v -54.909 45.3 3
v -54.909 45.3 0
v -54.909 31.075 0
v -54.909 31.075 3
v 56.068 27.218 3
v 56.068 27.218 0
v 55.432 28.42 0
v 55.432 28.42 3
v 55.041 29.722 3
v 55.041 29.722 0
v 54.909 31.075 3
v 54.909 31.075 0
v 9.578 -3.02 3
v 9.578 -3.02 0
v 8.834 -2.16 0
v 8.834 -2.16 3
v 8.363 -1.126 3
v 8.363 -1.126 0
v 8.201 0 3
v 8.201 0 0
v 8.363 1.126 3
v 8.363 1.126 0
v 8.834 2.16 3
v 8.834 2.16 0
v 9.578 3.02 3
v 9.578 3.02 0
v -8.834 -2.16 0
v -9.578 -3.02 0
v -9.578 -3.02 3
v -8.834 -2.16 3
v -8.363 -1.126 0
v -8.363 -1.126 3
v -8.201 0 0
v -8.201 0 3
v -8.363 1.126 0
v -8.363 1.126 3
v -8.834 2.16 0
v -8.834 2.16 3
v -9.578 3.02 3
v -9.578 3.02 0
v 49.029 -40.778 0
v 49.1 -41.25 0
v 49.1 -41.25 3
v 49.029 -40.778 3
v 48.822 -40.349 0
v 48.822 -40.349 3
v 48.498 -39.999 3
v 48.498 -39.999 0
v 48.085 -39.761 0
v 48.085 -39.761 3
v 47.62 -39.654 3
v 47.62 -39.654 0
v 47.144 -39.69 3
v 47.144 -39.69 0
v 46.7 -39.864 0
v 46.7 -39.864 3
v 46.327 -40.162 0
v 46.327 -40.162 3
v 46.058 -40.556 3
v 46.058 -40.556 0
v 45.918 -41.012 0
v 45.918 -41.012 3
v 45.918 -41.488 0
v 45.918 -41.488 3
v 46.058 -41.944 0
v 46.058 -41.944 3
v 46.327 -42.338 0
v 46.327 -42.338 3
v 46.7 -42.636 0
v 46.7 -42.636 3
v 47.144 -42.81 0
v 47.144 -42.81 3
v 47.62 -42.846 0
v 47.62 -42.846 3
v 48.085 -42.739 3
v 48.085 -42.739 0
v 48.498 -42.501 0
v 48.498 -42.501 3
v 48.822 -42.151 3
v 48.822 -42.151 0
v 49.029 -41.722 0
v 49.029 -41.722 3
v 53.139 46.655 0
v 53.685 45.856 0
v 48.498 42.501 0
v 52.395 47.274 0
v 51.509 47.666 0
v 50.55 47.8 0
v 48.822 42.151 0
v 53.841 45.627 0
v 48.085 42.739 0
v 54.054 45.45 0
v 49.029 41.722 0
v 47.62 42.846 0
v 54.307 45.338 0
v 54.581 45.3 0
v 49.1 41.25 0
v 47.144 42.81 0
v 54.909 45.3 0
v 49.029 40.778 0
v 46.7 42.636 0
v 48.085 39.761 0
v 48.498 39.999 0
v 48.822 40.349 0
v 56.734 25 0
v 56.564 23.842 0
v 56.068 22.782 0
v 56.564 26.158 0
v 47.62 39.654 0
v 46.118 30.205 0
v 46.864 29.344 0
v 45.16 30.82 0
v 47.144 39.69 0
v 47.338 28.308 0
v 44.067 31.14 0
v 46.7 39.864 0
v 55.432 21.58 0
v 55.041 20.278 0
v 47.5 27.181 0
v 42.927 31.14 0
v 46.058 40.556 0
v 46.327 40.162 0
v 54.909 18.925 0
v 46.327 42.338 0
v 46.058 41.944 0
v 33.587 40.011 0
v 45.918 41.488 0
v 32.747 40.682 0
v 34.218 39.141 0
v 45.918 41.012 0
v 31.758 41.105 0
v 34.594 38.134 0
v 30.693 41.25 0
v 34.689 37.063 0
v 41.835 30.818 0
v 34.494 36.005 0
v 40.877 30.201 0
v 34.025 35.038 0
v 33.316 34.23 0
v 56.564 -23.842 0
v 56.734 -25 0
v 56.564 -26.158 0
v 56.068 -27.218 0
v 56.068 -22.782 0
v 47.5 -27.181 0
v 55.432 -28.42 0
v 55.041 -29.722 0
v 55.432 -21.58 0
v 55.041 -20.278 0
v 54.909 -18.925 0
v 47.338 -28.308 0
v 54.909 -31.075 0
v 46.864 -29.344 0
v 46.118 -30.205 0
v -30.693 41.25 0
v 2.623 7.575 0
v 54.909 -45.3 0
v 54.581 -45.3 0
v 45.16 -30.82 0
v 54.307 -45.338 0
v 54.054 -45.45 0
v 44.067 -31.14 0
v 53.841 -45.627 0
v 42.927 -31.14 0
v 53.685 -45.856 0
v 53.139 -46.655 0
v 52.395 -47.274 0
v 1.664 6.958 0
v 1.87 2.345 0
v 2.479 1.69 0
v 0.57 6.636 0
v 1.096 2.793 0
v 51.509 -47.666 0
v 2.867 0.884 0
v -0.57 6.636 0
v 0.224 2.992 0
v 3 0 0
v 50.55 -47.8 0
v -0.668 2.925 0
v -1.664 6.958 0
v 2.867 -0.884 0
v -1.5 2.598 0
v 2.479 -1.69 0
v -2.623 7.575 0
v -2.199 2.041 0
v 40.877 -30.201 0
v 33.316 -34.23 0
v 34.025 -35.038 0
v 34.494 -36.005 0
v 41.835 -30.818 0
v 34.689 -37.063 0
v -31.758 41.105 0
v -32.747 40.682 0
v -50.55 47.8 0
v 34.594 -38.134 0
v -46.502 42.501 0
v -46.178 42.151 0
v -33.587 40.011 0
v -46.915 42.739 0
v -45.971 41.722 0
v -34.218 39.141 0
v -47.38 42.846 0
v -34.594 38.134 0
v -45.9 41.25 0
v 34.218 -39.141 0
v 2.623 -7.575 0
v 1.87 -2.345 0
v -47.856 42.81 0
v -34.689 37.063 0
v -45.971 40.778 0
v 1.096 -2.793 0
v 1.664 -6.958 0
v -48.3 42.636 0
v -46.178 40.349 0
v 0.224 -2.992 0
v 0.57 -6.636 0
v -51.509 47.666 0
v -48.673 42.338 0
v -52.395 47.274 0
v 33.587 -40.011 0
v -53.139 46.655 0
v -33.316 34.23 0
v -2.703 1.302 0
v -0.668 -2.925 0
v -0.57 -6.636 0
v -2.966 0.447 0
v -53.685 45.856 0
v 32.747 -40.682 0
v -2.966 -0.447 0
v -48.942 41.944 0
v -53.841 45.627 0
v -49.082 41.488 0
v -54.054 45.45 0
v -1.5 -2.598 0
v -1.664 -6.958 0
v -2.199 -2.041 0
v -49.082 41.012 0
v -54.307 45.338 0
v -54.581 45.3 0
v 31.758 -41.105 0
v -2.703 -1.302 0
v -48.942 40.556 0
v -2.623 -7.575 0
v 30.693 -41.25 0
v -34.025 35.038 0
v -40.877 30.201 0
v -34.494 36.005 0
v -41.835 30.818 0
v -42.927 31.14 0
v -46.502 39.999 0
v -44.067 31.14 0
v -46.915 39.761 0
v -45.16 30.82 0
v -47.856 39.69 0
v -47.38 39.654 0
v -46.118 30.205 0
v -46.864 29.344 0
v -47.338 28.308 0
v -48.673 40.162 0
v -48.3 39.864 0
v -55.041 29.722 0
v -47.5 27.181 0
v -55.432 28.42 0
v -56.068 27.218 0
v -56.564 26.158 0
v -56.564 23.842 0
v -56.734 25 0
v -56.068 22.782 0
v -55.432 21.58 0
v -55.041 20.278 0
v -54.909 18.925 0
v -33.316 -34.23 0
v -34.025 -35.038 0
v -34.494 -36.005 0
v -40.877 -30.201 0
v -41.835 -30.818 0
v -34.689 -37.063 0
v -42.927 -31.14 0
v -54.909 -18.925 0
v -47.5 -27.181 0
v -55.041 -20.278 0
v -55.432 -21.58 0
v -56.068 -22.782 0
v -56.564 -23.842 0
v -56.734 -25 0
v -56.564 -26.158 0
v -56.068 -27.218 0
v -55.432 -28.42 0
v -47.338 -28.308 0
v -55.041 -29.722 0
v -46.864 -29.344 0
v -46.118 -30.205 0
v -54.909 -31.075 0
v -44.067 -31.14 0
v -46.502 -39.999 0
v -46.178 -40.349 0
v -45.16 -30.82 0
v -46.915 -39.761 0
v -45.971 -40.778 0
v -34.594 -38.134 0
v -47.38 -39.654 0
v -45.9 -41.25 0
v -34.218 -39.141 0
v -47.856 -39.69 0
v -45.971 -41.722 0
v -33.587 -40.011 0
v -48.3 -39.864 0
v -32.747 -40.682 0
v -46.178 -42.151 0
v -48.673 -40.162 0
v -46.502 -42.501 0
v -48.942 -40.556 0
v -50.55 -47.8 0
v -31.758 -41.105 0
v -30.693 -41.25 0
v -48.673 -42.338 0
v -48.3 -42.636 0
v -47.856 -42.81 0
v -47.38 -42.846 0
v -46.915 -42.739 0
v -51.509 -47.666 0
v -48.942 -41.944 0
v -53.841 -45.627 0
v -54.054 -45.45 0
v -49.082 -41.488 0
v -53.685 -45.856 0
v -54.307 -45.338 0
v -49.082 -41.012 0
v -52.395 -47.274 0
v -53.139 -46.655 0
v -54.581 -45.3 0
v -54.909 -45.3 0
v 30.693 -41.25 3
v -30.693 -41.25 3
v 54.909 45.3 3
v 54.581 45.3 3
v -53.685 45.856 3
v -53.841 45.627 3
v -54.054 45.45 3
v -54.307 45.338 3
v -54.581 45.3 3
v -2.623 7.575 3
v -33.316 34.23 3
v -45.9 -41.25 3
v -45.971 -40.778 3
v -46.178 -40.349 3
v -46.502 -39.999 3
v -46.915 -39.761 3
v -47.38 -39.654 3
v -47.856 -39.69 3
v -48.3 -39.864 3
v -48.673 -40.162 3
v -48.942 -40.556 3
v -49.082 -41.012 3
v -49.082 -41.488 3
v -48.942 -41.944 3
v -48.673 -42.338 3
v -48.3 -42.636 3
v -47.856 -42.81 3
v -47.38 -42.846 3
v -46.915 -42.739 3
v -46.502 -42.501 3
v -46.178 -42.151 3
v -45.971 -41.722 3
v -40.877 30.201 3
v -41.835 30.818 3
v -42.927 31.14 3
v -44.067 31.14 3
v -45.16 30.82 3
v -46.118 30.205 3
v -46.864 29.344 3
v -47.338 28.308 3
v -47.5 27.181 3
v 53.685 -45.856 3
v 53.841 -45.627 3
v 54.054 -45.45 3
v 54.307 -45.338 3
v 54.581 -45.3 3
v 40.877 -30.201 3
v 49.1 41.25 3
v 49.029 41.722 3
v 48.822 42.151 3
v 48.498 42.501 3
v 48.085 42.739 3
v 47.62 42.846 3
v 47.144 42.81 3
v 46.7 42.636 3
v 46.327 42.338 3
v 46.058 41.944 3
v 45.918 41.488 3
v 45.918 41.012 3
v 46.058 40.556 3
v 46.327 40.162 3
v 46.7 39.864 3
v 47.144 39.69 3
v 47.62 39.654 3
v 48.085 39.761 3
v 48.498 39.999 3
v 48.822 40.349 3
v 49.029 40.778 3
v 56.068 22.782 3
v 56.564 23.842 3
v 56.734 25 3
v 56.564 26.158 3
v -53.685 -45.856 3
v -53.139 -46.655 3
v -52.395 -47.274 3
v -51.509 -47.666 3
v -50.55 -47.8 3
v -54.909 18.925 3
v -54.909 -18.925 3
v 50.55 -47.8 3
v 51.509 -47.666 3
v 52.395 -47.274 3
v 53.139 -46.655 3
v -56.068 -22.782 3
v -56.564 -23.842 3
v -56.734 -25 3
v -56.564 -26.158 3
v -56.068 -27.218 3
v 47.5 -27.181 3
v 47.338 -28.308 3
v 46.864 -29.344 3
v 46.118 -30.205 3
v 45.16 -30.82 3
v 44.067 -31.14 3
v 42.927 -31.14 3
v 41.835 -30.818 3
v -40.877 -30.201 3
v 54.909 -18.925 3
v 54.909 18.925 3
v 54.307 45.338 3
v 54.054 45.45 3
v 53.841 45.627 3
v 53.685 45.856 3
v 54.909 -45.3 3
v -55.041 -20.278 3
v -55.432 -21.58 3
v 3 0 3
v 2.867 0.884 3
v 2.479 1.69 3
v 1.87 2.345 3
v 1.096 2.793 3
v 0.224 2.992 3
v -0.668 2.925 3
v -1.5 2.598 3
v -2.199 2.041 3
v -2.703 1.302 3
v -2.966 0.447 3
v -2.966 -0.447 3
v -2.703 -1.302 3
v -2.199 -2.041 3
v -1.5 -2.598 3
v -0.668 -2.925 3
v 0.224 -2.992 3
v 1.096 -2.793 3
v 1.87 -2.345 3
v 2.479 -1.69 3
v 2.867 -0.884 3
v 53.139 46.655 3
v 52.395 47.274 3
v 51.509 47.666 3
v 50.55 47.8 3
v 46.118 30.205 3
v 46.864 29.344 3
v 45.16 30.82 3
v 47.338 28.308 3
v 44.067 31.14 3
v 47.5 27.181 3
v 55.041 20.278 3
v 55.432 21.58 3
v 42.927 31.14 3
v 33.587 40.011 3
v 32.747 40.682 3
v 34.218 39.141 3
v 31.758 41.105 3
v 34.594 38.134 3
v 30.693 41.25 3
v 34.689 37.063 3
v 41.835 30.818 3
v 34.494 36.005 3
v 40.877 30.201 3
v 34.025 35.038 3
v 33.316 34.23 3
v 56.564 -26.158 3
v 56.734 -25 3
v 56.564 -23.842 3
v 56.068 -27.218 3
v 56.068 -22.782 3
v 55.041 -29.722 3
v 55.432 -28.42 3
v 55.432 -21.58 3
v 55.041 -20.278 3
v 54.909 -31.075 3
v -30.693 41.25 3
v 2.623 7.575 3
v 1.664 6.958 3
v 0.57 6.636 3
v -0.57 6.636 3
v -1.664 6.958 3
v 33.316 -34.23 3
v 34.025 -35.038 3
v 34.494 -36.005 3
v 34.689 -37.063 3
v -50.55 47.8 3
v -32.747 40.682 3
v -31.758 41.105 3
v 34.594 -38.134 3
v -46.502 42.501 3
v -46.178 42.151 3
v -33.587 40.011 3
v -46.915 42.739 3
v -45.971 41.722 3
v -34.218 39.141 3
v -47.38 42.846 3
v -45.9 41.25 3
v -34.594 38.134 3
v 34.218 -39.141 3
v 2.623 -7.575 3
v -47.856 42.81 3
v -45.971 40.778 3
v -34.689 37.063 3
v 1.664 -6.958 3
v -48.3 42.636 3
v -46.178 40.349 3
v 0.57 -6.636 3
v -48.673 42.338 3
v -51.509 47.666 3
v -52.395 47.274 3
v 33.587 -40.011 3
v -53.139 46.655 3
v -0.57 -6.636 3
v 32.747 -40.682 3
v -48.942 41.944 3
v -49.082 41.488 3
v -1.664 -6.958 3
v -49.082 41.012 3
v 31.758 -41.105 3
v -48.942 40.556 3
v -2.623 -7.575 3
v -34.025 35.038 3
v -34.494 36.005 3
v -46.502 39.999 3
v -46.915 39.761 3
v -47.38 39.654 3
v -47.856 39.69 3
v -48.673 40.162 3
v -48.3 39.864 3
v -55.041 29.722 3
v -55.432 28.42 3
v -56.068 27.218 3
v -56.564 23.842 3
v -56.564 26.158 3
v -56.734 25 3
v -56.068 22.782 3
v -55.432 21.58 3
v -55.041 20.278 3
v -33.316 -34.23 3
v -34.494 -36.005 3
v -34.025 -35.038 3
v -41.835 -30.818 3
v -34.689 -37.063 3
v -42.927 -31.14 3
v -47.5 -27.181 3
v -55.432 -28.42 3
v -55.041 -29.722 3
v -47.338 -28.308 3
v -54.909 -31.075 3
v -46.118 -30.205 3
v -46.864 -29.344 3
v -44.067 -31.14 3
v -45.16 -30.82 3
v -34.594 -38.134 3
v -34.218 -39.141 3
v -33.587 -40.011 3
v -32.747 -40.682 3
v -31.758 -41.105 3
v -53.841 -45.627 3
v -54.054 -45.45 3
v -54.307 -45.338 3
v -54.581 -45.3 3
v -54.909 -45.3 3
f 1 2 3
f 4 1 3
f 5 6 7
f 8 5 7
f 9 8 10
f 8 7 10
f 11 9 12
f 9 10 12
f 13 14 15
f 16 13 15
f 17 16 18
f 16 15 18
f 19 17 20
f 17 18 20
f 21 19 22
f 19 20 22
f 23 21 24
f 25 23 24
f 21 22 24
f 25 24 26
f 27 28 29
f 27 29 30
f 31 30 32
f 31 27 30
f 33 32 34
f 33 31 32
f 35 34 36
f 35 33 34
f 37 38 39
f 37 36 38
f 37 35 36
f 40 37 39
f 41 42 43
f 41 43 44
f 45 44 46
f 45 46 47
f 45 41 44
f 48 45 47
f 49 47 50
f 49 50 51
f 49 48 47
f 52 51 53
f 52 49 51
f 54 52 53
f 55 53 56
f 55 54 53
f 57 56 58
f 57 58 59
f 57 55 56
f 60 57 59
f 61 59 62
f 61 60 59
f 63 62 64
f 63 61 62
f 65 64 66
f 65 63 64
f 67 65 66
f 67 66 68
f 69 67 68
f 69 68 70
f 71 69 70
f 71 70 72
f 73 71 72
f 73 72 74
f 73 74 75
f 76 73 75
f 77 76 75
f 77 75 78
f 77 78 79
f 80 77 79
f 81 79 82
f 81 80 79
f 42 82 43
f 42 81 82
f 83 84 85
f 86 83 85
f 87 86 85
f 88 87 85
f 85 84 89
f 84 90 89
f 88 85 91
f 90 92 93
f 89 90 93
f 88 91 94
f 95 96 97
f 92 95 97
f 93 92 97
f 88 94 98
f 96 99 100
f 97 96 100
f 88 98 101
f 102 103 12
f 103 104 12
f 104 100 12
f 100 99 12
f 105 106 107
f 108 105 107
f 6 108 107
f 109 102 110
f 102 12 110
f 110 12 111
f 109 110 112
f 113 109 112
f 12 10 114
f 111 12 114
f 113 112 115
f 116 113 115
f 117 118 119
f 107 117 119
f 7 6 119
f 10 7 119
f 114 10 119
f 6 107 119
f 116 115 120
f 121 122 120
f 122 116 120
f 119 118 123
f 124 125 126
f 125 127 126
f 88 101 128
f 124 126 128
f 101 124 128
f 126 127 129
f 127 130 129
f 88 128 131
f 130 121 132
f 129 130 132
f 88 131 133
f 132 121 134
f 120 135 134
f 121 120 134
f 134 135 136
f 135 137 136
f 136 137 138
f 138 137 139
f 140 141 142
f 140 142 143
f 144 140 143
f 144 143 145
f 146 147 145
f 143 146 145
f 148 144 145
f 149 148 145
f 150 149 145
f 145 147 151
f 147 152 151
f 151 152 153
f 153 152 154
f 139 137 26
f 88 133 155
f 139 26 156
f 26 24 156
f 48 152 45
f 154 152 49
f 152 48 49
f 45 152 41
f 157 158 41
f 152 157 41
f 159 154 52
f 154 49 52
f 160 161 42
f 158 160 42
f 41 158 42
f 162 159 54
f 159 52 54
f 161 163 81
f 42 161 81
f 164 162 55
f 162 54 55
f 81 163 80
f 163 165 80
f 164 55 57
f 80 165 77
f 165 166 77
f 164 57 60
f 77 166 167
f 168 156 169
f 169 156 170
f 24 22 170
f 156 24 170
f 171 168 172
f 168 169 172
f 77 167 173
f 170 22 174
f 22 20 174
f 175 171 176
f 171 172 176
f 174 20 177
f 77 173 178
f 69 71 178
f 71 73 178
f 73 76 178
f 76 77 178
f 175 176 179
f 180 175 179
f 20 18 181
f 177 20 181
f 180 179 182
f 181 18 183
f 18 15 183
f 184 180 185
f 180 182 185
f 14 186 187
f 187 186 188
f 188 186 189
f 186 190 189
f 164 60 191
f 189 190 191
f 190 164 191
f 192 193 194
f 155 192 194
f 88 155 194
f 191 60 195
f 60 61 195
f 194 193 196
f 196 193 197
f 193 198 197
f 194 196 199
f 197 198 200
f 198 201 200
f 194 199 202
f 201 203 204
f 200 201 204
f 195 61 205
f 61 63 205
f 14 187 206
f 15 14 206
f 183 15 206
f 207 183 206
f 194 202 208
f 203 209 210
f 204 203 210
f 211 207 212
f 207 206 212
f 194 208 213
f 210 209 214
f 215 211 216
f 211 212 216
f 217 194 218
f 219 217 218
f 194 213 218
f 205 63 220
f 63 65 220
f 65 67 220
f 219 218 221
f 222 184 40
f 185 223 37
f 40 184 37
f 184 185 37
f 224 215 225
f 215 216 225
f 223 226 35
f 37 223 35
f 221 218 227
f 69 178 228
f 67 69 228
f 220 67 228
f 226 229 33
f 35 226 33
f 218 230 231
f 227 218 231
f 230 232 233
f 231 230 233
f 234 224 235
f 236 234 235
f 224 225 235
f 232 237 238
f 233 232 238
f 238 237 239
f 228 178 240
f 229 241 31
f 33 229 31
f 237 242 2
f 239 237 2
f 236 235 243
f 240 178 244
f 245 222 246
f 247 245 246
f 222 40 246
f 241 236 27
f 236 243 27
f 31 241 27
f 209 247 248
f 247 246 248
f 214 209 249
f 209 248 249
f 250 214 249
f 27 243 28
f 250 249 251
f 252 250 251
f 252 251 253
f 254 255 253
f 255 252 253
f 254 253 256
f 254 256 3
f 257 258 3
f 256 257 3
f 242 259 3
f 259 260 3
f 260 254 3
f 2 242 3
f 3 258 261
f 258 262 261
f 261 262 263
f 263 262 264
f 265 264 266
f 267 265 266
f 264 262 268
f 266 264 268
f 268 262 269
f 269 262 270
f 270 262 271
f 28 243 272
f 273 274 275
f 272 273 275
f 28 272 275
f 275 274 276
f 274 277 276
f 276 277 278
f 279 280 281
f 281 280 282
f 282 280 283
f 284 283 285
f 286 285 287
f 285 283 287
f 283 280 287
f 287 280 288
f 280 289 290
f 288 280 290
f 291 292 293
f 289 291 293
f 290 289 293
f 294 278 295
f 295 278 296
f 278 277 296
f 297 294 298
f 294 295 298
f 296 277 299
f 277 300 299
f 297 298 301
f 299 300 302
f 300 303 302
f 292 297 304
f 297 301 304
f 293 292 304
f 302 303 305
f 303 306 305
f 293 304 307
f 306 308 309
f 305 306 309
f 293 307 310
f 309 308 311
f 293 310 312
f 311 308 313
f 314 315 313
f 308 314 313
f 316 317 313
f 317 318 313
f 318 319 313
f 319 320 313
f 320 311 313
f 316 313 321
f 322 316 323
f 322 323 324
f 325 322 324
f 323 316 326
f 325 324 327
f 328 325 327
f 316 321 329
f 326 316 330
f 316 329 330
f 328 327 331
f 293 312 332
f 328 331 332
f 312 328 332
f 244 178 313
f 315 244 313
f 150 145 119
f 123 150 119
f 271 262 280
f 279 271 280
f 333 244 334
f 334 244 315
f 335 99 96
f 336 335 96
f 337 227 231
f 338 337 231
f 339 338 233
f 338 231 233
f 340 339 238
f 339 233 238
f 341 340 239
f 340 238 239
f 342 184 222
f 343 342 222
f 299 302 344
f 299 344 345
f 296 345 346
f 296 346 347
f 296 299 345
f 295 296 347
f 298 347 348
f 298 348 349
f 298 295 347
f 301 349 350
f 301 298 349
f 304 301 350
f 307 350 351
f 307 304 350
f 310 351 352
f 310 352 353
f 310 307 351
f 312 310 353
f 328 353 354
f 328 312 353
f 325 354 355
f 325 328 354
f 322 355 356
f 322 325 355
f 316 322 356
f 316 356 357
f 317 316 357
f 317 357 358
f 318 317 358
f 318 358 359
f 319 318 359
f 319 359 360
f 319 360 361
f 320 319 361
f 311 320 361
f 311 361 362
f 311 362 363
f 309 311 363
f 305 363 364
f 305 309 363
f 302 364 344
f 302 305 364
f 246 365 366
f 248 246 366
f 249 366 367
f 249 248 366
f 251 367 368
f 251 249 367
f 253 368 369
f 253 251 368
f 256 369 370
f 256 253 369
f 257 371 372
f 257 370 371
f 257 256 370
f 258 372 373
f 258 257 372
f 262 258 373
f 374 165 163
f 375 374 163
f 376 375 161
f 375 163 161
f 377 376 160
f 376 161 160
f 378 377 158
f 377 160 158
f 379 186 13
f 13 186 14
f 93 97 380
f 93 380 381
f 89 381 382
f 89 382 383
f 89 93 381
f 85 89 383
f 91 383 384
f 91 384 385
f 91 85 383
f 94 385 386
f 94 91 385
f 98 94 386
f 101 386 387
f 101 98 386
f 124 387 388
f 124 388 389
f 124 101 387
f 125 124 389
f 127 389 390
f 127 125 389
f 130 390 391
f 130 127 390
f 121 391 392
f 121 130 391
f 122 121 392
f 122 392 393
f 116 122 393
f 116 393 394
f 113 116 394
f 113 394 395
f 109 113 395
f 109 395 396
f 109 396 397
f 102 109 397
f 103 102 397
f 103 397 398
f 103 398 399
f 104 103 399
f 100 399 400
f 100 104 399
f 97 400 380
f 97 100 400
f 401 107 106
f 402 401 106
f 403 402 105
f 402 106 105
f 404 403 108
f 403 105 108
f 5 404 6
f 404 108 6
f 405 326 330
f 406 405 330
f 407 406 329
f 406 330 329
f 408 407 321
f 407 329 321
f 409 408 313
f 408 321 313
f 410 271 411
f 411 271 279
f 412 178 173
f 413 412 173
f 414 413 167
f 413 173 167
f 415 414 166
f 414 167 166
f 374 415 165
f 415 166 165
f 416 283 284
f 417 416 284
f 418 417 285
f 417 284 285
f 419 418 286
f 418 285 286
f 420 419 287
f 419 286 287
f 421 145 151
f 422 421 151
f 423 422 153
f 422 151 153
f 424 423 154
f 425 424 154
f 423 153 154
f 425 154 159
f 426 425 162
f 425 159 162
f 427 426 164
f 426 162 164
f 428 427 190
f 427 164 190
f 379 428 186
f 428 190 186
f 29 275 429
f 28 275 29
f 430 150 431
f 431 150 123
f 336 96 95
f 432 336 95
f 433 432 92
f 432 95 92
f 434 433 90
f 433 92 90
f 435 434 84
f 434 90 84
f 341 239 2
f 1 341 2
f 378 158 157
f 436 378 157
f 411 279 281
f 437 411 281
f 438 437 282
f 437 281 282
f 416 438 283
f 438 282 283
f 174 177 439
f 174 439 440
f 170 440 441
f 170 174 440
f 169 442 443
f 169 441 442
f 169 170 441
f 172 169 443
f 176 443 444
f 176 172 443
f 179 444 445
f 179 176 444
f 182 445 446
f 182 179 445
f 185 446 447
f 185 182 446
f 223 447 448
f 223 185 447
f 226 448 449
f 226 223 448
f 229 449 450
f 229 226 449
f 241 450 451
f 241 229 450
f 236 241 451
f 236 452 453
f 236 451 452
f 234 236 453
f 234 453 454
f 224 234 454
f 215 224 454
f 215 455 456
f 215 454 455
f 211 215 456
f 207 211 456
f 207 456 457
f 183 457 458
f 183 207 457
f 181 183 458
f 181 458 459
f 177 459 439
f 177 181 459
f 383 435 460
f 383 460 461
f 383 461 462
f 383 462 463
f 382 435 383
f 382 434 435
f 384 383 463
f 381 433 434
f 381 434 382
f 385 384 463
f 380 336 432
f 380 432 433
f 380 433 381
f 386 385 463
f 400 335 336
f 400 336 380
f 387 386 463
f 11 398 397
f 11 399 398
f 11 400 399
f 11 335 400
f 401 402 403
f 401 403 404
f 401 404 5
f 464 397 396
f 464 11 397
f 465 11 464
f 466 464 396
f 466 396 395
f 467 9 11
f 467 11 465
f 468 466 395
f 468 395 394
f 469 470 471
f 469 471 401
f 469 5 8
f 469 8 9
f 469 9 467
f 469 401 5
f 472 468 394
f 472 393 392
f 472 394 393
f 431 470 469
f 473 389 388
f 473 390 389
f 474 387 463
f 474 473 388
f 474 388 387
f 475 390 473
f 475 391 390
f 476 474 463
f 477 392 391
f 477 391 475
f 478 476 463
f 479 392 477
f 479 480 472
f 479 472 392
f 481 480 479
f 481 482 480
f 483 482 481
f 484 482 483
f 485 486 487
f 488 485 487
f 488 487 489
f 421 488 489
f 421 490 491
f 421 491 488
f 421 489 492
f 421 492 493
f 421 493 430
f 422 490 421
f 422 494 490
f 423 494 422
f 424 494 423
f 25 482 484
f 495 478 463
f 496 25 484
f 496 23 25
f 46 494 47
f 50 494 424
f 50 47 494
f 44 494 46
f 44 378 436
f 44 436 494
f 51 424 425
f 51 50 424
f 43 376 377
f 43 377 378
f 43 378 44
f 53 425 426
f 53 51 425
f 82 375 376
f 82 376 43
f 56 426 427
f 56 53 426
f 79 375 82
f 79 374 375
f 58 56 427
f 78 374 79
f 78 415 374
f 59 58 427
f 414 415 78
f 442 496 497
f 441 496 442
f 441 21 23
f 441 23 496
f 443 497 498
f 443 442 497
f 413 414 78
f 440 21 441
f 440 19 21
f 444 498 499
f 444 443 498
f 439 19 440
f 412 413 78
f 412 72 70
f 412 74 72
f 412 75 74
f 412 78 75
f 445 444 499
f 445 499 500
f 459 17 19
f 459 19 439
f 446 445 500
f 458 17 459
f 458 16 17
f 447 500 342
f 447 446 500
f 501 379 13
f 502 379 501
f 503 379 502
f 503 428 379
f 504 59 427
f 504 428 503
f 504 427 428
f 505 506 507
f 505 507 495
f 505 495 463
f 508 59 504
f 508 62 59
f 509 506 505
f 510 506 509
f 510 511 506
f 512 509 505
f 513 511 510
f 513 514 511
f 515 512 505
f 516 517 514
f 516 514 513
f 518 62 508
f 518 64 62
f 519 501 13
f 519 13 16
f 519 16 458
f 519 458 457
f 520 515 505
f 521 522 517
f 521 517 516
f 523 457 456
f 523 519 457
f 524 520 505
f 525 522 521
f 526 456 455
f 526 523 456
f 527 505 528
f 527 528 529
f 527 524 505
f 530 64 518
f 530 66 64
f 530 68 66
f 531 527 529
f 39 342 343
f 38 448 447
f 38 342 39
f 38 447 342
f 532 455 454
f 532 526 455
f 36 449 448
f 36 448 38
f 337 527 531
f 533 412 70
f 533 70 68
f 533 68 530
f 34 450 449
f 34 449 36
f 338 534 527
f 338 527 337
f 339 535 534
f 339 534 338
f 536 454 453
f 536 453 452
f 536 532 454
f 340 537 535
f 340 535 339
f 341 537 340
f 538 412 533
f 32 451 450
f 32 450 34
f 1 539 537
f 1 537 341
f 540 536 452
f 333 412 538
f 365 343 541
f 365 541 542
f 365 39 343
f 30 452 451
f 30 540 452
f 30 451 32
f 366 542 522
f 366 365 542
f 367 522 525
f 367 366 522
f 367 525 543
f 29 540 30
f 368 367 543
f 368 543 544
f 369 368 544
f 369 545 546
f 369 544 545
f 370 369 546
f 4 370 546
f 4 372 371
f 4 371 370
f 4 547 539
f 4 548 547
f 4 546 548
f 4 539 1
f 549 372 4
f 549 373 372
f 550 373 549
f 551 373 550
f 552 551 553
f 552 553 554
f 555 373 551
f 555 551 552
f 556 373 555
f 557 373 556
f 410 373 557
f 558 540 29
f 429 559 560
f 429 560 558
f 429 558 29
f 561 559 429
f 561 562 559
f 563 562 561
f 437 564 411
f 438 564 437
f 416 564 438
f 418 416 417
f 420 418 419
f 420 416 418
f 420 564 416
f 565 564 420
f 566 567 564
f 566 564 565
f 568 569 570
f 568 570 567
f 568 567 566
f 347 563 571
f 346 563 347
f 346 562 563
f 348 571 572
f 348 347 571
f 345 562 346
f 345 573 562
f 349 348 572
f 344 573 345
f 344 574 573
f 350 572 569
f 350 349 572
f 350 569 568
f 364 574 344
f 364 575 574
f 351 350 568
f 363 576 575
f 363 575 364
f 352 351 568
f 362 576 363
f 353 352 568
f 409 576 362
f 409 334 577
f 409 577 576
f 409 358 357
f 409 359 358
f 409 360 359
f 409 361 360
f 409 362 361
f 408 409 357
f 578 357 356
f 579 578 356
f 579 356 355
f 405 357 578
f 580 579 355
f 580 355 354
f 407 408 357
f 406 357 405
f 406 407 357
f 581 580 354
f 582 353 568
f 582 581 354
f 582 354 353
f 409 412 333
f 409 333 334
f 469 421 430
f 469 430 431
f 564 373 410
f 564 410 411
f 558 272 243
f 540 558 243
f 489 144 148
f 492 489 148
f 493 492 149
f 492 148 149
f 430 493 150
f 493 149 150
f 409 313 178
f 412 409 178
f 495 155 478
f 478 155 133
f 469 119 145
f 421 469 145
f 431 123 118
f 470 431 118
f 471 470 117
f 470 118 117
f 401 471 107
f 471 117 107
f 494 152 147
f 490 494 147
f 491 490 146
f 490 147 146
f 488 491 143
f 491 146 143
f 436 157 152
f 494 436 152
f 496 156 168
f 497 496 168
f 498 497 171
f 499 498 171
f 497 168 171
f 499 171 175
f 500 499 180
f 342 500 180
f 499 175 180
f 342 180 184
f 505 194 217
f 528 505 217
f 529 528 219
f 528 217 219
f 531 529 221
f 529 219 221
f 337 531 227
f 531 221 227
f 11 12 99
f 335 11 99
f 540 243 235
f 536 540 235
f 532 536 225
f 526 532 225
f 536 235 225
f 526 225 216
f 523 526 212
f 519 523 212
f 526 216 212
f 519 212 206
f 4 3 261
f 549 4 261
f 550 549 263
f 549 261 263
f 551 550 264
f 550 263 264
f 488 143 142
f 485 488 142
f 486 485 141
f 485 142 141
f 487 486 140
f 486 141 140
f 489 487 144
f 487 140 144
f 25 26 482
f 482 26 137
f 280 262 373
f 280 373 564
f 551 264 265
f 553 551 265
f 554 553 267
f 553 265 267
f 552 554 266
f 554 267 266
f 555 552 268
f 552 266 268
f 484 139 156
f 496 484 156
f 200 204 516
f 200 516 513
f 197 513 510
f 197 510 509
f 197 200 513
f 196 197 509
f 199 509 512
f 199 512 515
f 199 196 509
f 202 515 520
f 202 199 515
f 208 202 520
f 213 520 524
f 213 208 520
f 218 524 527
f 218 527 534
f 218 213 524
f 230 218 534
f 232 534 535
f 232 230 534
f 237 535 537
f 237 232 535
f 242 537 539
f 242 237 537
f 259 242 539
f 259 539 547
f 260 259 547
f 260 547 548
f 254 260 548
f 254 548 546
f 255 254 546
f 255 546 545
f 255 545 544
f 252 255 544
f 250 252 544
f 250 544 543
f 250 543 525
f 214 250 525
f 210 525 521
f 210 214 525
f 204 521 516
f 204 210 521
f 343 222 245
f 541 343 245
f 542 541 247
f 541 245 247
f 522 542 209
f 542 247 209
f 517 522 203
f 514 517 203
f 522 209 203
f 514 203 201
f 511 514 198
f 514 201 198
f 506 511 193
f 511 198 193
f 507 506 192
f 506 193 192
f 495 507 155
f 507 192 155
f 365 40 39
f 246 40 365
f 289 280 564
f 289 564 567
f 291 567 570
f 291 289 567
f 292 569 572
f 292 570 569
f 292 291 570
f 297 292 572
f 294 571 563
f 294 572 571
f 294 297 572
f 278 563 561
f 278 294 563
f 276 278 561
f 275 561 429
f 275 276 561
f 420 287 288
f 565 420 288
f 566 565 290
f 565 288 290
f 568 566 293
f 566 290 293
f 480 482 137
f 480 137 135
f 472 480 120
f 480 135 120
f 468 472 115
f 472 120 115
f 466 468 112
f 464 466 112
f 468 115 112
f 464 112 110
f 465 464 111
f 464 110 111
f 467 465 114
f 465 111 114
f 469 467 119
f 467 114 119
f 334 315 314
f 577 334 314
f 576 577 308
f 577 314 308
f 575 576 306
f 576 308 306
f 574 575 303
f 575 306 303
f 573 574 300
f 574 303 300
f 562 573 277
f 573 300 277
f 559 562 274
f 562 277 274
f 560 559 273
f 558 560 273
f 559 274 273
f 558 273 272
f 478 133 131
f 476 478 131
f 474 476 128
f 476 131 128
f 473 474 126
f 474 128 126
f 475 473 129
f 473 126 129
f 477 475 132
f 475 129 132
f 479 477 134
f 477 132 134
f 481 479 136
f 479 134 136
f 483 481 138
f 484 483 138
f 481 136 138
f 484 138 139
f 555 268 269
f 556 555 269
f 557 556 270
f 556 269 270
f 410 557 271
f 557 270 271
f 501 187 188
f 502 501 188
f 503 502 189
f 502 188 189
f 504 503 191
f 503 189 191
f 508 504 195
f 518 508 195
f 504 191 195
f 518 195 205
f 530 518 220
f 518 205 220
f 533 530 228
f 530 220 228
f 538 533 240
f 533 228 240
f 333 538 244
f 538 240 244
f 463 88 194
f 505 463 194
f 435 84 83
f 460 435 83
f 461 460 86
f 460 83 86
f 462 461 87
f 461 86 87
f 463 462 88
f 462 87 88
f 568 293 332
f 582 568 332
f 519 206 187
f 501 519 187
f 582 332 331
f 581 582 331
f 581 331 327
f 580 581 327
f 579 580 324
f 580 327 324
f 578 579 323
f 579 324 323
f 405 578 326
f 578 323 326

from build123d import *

# Parameters (mm, degrees)
SKETCH1_R               = 1.6
BOSS_EXTRUDE1_DEPTH     = 3
CUT_EXTRUDE1_DEPTH      = 75.246874183
CUT_EXTRUDE1_DEPTH_BACK = 75.246874183
CUT_EXTRUDE2_DEPTH      = 75.246874183
CUT_EXTRUDE2_DEPTH_BACK = 75.246874183
SKETCH4_R               = 3


with BuildPart() as part:
    # Sketch1 → Boss-Extrude1 (new body)
    with BuildSketch(Plane(origin=(0, 0, 0), x_dir=(-1, 0, 0), z_dir=(0, 0, 1))):
        with BuildLine():
            Line((-54.909101966, 18.924588491), (-54.909101966, -18.924588491))
            ThreePointArc((-54.909101966, -18.924588491), (-55.205040179, -20.938429487), (-56.067832125, -22.781992624))
            ThreePointArc((-56.067832125, -22.781992624), (-56.734101966, -25), (-56.067832125, -27.218007376))
            ThreePointArc((-56.067832125, -27.218007376), (-55.205040179, -29.061570513), (-54.909101966, -31.075411509))
            Line((-54.909101966, -31.075411509), (-54.909101966, -45.3))
            Line((-54.909101966, -45.3), (-54.581128874, -45.3))
            ThreePointArc((-54.581128874, -45.3), (-54.054082597, -45.450163414), (-53.685322458, -45.855555556))
            ThreePointArc((-53.685322458, -45.855555556), (-52.394661968, -47.27442805), (-50.55, -47.8))
            Line((-50.55, -47.8), (50.55, -47.8))
            ThreePointArc((50.55, -47.8), (52.394661968, -47.27442805), (53.685322458, -45.855555556))
            ThreePointArc((53.685322458, -45.855555556), (54.054082597, -45.450163414), (54.581128874, -45.3))
            Line((54.581128874, -45.3), (54.909101966, -45.3))
            Line((54.909101966, -45.3), (54.909101966, -31.075411509))
            ThreePointArc((54.909101966, -31.075411509), (55.205040179, -29.061570513), (56.067832125, -27.218007376))
            ThreePointArc((56.067832125, -27.218007376), (56.734101966, -25), (56.067832125, -22.781992624))
            ThreePointArc((56.067832125, -22.781992624), (55.205040179, -20.938429487), (54.909101966, -18.924588491))
            Line((54.909101966, -18.924588491), (54.909101966, 18.924588491))
            ThreePointArc((54.909101966, 18.924588491), (55.205040179, 20.938429487), (56.067832125, 22.781992624))
            ThreePointArc((56.067832125, 22.781992624), (56.734101966, 25), (56.067832125, 27.218007376))
            ThreePointArc((56.067832125, 27.218007376), (55.205040179, 29.061570513), (54.909101966, 31.075411509))
            Line((54.909101966, 31.075411509), (54.909101966, 45.3))
            Line((54.909101966, 45.3), (54.581128874, 45.3))
            ThreePointArc((54.581128874, 45.3), (54.054082597, 45.450163414), (53.685322458, 45.855555556))
            ThreePointArc((53.685322458, 45.855555556), (52.394661968, 47.27442805), (50.55, 47.8))
            Line((50.55, 47.8), (-50.55, 47.8))
            ThreePointArc((-50.55, 47.8), (-52.394661968, 47.27442805), (-53.685322458, 45.855555556))
            ThreePointArc((-53.685322458, 45.855555556), (-54.054082597, 45.450163414), (-54.581128874, 45.3))
            Line((-54.581128874, 45.3), (-54.909101966, 45.3))
            Line((-54.909101966, 45.3), (-54.909101966, 31.075411509))
            ThreePointArc((-54.909101966, 31.075411509), (-55.205040179, 29.061570513), (-56.067832125, 27.218007376))
            ThreePointArc((-56.067832125, 27.218007376), (-56.734101966, 25), (-56.067832125, 22.781992624))
            ThreePointArc((-56.067832125, 22.781992624), (-55.205040179, 20.938429487), (-54.909101966, 18.924588491))
        make_face()
        with Locations(Location((-47.5, 41.25, 0), (0, 0, 180))):
            Circle(SKETCH1_R, mode=Mode.SUBTRACT)
        with Locations(Location((-47.5, -41.25, 0), (0, 0, 180))):
            Circle(SKETCH1_R, mode=Mode.SUBTRACT)
        with Locations(Location((47.5, -41.25, 0), (0, 0, 180))):
            Circle(SKETCH1_R, mode=Mode.SUBTRACT)
        with Locations(Location((47.5, 41.25, 0), (0, 0, 180))):
            Circle(SKETCH1_R, mode=Mode.SUBTRACT)
    extrude(amount=BOSS_EXTRUDE1_DEPTH)

    # Sketch2 → Cut-Extrude1 (cut, two sides: drawn at the far end of the back side and taken through both)
    with BuildSketch(Plane.XY.offset(3).offset(-CUT_EXTRUDE1_DEPTH_BACK)):
        with BuildLine():
            Line((40.877253378, -30.200886552), (9.578203228, -3.020132474))
            ThreePointArc((9.578203228, -3.020132474), (8.200949849, 0), (9.578203228, 3.020132474))
            Line((9.578203228, 3.020132474), (40.877253378, 30.200886552))
            ThreePointArc((40.877253378, 30.200886552), (45.159670677, 30.82018992), (47.5, 27.180754078))
            Line((47.5, 27.180754078), (47.5, -27.180754078))
            ThreePointArc((47.5, -27.180754078), (45.159670677, -30.82018992), (40.877253378, -30.200886552))
        make_face()
        with BuildLine():
            Line((-33.315736166, -34.229867526), (-2.622746622, -7.575429238))
            ThreePointArc((-2.622746622, -7.575429238), (0, -6.595561711), (2.622746622, -7.575429238))
            Line((2.622746622, -7.575429238), (33.315736166, -34.229867526))
            ThreePointArc((33.315736166, -34.229867526), (34.440023698, -38.649905373), (30.692989545, -41.25))
            Line((30.692989545, -41.25), (-30.692989545, -41.25))
            ThreePointArc((-30.692989545, -41.25), (-34.440023698, -38.649905373), (-33.315736166, -34.229867526))
        make_face()
        with BuildLine():
            Line((-40.877253378, -30.200886552), (-9.578203228, -3.020132474))
            ThreePointArc((-9.578203228, -3.020132474), (-8.200949849, 0), (-9.578203228, 3.020132474))
            Line((-9.578203228, 3.020132474), (-40.877253378, 30.200886552))
            ThreePointArc((-40.877253378, 30.200886552), (-45.159670677, 30.82018992), (-47.5, 27.180754078))
            Line((-47.5, 27.180754078), (-47.5, -27.180754078))
            ThreePointArc((-47.5, -27.180754078), (-45.159670677, -30.82018992), (-40.877253378, -30.200886552))
        make_face()
        with BuildLine():
            Line((-30.692989545, 41.25), (30.692989545, 41.25))
            ThreePointArc((30.692989545, 41.25), (34.440023698, 38.649905373), (33.315736166, 34.229867526))
            Line((33.315736166, 34.229867526), (2.622746622, 7.575429238))
            ThreePointArc((2.622746622, 7.575429238), (0, 6.595561711), (-2.622746622, 7.575429238))
            Line((-2.622746622, 7.575429238), (-33.315736166, 34.229867526))
            ThreePointArc((-33.315736166, 34.229867526), (-34.440023698, 38.649905373), (-30.692989545, 41.25))
        make_face()
    extrude(amount=CUT_EXTRUDE1_DEPTH + CUT_EXTRUDE1_DEPTH_BACK, mode=Mode.SUBTRACT)

    # Sketch4 → Cut-Extrude2 (cut, two sides: drawn at the far end of the back side and taken through both)
    with BuildSketch(Plane.XY.offset(3).offset(-CUT_EXTRUDE2_DEPTH_BACK)):
        Circle(SKETCH4_R)
    extrude(amount=CUT_EXTRUDE2_DEPTH + CUT_EXTRUDE2_DEPTH_BACK, mode=Mode.SUBTRACT)


solid = part.part
